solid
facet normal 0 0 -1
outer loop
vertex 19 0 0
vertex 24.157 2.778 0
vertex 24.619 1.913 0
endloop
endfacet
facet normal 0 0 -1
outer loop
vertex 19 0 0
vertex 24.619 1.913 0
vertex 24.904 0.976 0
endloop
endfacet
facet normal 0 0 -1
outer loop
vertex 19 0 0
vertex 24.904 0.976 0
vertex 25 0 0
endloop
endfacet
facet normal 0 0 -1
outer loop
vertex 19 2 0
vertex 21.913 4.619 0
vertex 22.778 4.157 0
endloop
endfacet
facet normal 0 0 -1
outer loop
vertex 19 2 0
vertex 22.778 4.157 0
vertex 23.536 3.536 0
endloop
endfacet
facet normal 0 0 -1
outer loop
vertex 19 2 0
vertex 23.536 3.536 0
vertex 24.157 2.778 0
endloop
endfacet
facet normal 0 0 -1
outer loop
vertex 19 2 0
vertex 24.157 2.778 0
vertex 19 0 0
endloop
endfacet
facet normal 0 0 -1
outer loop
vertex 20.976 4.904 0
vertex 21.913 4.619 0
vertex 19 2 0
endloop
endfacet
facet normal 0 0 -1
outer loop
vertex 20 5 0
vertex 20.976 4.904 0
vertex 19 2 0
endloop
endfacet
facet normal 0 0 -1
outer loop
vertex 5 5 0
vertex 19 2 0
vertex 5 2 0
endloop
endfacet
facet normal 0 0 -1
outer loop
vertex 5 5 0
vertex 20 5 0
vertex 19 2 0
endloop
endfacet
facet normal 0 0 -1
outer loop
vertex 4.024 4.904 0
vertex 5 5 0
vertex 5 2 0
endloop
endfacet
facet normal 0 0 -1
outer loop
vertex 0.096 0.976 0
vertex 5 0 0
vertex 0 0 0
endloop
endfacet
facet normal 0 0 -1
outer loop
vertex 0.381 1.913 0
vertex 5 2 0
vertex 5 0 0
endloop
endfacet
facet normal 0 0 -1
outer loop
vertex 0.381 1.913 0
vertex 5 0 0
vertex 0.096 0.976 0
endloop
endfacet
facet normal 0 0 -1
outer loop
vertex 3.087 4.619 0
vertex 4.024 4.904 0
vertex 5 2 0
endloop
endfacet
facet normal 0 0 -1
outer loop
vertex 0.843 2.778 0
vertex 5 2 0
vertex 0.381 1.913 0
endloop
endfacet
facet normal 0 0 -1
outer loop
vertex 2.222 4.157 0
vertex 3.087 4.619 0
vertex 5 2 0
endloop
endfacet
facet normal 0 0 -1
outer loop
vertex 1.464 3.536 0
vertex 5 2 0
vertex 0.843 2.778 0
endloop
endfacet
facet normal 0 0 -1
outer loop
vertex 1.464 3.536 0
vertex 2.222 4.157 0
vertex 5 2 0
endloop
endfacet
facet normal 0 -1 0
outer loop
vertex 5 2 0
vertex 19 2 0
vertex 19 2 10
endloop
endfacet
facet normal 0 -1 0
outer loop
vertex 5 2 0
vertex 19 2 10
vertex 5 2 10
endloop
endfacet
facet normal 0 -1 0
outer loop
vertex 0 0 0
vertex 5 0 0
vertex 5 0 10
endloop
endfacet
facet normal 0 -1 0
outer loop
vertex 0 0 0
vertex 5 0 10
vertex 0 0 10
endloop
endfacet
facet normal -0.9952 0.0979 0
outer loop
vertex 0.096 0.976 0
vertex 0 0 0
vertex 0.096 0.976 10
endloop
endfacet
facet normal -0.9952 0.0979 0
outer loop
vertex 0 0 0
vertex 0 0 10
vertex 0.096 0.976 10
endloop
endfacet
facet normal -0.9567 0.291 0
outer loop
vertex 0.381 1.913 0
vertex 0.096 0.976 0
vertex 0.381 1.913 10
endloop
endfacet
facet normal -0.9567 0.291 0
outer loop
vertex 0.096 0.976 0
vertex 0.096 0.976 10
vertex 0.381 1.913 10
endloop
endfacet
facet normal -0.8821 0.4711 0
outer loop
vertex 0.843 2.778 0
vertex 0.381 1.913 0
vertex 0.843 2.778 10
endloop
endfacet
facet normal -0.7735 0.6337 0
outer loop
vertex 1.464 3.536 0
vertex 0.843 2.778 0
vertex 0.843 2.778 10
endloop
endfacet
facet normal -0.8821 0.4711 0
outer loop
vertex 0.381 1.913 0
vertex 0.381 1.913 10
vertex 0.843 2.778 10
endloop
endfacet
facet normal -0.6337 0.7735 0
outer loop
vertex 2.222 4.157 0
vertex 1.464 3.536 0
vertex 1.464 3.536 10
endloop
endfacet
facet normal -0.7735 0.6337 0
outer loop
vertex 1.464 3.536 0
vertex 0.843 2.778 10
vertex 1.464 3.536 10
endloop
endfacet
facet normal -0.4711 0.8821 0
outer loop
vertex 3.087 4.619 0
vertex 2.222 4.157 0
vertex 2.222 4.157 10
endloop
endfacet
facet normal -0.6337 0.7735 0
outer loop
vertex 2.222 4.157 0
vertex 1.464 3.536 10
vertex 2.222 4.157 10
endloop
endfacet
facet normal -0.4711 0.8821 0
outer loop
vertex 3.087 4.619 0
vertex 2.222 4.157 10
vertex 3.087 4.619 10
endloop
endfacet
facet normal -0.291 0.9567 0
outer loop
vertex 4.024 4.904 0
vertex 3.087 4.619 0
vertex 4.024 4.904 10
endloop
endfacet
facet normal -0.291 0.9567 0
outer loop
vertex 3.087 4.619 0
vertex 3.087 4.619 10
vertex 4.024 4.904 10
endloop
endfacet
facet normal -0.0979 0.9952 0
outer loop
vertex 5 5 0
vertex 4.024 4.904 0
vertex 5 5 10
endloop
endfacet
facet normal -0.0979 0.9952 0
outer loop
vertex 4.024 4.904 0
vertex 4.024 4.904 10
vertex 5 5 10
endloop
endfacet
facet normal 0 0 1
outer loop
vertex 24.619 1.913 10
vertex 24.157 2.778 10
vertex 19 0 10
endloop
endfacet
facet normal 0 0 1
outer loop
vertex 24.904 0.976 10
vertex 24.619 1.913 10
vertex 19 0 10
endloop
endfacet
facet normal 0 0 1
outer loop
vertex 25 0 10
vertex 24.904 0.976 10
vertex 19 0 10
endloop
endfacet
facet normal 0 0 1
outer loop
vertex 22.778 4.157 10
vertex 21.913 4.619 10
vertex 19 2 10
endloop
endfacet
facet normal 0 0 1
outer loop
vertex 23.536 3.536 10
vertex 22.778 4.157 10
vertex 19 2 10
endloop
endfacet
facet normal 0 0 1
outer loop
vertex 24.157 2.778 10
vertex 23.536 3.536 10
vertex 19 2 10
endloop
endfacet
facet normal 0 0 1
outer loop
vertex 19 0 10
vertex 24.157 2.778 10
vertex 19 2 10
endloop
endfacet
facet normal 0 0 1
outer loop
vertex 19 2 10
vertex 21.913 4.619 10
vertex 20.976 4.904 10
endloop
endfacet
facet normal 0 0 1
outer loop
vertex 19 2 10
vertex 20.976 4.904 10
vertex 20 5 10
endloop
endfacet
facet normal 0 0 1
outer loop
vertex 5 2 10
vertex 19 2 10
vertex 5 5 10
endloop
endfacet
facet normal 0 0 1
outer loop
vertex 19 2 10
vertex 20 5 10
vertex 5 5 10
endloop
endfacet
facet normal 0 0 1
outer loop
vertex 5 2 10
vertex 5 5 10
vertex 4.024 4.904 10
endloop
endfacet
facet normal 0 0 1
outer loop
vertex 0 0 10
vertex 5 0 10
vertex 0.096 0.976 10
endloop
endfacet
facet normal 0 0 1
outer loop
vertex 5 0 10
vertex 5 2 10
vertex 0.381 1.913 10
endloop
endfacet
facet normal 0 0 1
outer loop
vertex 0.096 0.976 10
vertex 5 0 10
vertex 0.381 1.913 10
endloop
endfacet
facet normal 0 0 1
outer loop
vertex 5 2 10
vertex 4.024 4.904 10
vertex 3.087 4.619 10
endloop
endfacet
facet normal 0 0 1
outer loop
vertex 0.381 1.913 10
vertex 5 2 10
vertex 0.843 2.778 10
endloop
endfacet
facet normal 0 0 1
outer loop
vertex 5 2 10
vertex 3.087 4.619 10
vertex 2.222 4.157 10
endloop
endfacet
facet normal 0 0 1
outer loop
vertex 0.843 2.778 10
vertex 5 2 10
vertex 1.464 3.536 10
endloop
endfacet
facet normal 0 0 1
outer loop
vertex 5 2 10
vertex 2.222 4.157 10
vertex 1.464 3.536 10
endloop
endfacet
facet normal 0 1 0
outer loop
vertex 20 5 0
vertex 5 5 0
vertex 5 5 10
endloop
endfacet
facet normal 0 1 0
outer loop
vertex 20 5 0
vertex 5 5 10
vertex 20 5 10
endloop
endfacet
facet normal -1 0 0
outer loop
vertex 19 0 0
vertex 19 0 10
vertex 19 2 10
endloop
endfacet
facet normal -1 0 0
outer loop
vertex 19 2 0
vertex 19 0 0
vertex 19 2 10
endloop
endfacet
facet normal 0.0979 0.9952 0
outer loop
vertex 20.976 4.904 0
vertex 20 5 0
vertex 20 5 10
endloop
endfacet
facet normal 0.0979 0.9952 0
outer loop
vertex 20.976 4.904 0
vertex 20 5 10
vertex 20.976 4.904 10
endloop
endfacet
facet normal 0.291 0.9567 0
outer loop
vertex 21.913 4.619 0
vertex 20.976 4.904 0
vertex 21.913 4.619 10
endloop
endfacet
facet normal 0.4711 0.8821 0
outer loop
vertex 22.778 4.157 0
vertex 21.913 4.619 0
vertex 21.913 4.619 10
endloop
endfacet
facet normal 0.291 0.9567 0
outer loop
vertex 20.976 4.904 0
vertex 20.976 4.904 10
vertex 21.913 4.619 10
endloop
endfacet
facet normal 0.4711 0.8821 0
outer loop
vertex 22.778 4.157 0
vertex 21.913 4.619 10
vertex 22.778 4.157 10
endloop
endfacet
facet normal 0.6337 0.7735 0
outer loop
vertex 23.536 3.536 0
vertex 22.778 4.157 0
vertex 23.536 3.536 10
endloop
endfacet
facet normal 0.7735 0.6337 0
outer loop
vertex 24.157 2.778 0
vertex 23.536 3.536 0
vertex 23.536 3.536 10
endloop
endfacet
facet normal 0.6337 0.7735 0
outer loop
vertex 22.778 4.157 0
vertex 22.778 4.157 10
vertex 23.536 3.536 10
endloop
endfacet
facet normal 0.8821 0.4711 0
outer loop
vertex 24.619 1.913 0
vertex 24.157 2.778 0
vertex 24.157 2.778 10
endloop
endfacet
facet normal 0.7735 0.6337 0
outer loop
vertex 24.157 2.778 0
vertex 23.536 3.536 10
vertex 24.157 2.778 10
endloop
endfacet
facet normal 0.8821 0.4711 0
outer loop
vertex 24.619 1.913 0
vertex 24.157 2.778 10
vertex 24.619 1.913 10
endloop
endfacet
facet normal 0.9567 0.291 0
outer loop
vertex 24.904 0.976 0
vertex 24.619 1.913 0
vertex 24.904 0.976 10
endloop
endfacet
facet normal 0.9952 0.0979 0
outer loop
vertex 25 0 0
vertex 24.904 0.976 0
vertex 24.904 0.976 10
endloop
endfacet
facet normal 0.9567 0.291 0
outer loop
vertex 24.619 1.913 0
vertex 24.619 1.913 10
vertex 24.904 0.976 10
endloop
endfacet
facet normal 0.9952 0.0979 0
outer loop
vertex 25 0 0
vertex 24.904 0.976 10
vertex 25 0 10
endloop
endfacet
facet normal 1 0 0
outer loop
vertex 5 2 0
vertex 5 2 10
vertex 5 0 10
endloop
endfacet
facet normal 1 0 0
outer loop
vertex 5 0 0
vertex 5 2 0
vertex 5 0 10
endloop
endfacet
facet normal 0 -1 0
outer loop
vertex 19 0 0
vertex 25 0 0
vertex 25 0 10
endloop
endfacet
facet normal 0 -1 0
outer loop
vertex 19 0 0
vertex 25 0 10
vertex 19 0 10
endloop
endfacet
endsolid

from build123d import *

# Parameters (mm, degrees)
BOSS_EXTRUDE1_DEPTH = 10
FILLET2_R           = 5
FILLET3_R           = 5


with BuildPart() as part:
    # Sketch1 → Boss-Extrude1 (new body)
    with BuildSketch(Plane.XY):
        Polygon((0, 0), (0, 5), (25, 5), (25, 0), (19, 0), (19, 2), (5, 2), (5, 0), align=None)
    extrude(amount=BOSS_EXTRUDE1_DEPTH)

    # Fillet2
    fillet2_edges = [part.edges().sort_by_distance(p)[0] for p in [
        (0, 5, 5),
    ]]
    fillet(fillet2_edges, radius=FILLET2_R - 0.0001)  # a hair under: the kernel refuses the full size

    # Fillet3
    fillet3_edges = [part.edges().sort_by_distance(p)[0] for p in [
        (25, 5, 5),
    ]]
    fillet(fillet3_edges, radius=FILLET3_R - 0.0001)  # a hair under: the kernel refuses the full size


solid = part.part
